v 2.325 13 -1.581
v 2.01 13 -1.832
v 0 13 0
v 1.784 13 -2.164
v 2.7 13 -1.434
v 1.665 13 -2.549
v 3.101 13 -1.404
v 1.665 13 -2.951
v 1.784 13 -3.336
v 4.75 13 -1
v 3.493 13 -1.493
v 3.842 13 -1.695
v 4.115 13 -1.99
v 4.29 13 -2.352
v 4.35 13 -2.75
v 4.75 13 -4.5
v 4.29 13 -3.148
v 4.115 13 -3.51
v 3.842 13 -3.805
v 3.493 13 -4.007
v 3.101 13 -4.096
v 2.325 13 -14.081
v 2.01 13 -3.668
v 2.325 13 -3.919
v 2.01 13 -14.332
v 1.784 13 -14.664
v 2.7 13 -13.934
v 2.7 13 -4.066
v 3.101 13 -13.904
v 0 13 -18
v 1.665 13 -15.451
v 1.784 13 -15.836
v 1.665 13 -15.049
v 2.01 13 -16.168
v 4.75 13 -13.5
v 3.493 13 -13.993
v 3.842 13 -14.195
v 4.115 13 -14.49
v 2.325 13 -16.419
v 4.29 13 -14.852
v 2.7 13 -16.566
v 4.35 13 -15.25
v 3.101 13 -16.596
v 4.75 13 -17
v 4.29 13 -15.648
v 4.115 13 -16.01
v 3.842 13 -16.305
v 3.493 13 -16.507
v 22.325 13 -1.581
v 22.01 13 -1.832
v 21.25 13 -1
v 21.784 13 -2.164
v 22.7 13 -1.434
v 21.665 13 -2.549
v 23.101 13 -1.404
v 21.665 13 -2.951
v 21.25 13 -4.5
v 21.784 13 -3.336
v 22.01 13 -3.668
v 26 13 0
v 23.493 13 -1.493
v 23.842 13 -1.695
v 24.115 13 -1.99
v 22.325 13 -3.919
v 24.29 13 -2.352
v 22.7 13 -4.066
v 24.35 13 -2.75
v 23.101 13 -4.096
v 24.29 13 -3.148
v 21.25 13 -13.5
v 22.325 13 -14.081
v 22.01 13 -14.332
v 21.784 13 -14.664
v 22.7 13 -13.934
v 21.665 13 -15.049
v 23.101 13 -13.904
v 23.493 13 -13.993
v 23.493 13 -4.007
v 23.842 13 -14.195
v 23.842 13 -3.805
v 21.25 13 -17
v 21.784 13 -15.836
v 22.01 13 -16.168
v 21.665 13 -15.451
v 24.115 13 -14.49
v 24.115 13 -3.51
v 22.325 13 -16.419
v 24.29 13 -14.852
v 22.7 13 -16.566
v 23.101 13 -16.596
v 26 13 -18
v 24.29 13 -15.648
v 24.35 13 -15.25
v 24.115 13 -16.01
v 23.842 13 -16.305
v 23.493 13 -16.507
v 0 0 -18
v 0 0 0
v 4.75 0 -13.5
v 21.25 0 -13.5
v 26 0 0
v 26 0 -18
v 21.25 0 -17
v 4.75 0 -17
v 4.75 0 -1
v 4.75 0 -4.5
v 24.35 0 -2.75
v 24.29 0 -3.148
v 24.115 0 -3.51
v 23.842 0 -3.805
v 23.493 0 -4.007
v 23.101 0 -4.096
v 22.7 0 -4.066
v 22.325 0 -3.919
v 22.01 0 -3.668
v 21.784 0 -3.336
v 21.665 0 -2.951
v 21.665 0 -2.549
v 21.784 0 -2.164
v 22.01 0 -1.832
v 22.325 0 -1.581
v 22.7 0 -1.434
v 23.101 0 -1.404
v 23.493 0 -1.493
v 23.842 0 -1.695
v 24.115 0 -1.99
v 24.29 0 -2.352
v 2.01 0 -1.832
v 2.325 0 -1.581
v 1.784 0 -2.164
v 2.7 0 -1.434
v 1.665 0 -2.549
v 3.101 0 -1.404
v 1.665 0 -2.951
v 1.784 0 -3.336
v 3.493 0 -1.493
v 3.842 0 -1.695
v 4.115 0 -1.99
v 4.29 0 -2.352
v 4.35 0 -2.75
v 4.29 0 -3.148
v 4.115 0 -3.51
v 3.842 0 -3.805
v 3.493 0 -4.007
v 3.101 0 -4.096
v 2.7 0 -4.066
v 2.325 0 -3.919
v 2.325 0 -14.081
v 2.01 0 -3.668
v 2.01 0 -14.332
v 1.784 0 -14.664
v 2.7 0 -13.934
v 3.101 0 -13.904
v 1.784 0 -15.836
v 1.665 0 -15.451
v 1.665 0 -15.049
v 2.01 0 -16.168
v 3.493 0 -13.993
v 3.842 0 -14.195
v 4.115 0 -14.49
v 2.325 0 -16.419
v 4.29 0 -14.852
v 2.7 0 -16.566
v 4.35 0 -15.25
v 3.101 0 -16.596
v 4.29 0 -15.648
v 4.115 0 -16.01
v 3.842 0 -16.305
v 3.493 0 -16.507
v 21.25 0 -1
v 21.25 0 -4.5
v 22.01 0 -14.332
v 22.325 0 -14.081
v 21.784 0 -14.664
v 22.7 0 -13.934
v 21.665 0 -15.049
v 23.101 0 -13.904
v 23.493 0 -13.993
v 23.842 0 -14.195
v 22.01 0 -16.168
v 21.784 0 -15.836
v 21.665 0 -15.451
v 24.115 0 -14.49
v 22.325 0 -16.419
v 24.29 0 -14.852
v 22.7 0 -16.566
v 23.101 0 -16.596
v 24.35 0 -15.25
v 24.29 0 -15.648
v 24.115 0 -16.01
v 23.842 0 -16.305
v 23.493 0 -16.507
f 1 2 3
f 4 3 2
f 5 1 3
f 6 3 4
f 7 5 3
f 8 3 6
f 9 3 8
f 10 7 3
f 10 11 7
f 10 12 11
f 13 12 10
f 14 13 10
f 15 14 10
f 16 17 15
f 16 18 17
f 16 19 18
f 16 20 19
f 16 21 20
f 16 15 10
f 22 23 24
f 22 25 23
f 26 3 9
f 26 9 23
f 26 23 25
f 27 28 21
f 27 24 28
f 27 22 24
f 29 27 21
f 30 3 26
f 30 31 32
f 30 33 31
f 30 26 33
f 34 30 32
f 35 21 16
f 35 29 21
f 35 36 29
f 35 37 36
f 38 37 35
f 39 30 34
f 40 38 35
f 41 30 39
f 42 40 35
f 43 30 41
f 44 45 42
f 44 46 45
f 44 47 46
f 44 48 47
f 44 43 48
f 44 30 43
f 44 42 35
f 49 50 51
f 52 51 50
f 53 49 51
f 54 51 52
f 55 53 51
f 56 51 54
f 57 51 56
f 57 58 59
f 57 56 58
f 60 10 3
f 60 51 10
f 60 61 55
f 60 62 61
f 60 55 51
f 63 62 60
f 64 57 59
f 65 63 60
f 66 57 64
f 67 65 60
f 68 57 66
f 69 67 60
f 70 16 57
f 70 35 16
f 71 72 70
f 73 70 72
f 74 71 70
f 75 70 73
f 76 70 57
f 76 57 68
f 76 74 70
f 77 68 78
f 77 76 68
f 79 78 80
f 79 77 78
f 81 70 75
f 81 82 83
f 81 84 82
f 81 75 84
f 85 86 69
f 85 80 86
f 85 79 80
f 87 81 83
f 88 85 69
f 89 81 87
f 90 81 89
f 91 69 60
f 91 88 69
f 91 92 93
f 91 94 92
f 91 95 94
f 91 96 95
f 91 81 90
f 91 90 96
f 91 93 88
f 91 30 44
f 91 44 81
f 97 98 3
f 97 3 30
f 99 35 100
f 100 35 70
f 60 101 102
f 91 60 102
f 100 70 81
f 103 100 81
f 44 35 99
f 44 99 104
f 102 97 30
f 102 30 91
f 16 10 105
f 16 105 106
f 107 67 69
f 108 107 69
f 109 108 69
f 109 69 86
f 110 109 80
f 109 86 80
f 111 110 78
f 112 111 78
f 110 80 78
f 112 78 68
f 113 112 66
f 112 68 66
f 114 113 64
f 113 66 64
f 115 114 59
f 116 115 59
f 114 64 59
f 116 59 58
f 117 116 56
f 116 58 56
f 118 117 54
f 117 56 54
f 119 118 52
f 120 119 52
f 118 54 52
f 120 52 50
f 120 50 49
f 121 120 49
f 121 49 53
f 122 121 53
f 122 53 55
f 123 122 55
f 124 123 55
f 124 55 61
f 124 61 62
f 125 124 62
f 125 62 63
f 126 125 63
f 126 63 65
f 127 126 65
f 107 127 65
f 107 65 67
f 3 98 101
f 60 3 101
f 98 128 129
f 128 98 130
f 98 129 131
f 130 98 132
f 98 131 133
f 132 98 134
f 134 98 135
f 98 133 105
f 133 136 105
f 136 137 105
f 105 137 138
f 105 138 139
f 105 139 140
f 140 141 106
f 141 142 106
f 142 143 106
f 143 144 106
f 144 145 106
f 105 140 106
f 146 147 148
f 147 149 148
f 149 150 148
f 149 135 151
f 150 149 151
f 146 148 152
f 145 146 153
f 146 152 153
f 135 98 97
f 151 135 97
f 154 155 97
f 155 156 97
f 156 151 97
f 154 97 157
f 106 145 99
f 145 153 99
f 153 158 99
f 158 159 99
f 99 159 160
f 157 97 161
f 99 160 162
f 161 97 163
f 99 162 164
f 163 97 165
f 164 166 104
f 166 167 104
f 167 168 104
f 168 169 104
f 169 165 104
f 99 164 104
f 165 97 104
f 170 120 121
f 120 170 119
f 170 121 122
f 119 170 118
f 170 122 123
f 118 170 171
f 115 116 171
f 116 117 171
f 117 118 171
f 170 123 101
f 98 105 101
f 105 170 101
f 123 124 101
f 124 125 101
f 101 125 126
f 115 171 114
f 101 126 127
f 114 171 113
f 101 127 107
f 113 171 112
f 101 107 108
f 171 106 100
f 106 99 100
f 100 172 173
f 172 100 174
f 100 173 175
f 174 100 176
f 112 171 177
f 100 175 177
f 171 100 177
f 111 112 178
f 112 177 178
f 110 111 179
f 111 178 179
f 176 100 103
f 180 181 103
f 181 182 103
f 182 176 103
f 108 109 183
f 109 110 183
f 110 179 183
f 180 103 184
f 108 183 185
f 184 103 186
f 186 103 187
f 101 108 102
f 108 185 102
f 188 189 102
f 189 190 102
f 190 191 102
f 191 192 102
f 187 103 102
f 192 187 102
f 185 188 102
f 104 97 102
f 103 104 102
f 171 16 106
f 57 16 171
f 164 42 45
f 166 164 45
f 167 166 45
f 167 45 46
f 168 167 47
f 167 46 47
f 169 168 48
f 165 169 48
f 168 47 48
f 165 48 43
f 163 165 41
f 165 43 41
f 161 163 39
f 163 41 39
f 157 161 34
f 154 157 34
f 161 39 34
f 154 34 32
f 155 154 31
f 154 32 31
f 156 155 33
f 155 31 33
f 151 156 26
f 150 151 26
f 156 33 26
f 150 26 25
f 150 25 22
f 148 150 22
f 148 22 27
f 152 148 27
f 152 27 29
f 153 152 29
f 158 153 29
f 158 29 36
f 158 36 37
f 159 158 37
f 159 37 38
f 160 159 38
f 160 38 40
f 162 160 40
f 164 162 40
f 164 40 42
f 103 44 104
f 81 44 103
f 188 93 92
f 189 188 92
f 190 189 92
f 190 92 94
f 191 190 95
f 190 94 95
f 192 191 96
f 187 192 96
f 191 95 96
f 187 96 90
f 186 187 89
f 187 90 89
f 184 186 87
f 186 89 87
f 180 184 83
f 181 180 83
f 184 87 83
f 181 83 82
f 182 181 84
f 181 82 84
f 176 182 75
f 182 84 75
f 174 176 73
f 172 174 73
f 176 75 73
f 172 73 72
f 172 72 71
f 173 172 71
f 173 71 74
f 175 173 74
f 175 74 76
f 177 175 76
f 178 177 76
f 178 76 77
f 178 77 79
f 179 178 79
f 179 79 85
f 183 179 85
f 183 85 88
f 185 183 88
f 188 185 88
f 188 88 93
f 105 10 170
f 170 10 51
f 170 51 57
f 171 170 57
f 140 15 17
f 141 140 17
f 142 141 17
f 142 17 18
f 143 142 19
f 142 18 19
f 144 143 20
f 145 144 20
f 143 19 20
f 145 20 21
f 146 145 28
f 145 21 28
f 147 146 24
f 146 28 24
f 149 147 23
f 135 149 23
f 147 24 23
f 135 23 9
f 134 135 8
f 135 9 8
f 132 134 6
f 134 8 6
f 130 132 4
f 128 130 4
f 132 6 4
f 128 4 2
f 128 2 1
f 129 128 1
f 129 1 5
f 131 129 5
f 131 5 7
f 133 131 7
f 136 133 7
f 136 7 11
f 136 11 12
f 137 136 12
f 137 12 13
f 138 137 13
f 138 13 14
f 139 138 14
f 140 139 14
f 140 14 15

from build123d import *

# Parameters (mm, degrees)
SKETCH1_W           = 26
SKETCH1_H           = 18
BOSS_EXTRUDE1_DEPTH = 13
SKETCH2_R           = 1.35
SKETCH2_W           = 16.5
SKETCH2_H           = 3.5
CUT_EXTRUDE1_DEPTH  = 14


with BuildPart() as part:
    # Sketch1 → Boss-Extrude1 (new body)
    with BuildSketch(Plane(origin=(0, 0, 0), x_dir=(1, 0, 0), z_dir=(0, 1, 0))):
        with Locations((13, 9)):
            Rectangle(SKETCH1_W, SKETCH1_H)
    extrude(amount=BOSS_EXTRUDE1_DEPTH)

    # Sketch2 → Cut-Extrude1 (cut, through all)
    with BuildSketch(Plane(origin=(0, 13, 0), x_dir=(1, 0, 0), z_dir=(0, 1, 0))):
        with Locations((3, 15.25)):
            Circle(SKETCH2_R)
        with Locations((23, 15.25)):
            Circle(SKETCH2_R)
        with Locations((3, 2.75)):
            Circle(SKETCH2_R)
        with Locations((23, 2.75)):
            Circle(SKETCH2_R)
        with Locations((13, 15.25)):
            Rectangle(SKETCH2_W, SKETCH2_H)
        with Locations((13, 2.75)):
            Rectangle(SKETCH2_W, SKETCH2_H)
    extrude(amount=-CUT_EXTRUDE1_DEPTH, mode=Mode.SUBTRACT)


solid = part.part
